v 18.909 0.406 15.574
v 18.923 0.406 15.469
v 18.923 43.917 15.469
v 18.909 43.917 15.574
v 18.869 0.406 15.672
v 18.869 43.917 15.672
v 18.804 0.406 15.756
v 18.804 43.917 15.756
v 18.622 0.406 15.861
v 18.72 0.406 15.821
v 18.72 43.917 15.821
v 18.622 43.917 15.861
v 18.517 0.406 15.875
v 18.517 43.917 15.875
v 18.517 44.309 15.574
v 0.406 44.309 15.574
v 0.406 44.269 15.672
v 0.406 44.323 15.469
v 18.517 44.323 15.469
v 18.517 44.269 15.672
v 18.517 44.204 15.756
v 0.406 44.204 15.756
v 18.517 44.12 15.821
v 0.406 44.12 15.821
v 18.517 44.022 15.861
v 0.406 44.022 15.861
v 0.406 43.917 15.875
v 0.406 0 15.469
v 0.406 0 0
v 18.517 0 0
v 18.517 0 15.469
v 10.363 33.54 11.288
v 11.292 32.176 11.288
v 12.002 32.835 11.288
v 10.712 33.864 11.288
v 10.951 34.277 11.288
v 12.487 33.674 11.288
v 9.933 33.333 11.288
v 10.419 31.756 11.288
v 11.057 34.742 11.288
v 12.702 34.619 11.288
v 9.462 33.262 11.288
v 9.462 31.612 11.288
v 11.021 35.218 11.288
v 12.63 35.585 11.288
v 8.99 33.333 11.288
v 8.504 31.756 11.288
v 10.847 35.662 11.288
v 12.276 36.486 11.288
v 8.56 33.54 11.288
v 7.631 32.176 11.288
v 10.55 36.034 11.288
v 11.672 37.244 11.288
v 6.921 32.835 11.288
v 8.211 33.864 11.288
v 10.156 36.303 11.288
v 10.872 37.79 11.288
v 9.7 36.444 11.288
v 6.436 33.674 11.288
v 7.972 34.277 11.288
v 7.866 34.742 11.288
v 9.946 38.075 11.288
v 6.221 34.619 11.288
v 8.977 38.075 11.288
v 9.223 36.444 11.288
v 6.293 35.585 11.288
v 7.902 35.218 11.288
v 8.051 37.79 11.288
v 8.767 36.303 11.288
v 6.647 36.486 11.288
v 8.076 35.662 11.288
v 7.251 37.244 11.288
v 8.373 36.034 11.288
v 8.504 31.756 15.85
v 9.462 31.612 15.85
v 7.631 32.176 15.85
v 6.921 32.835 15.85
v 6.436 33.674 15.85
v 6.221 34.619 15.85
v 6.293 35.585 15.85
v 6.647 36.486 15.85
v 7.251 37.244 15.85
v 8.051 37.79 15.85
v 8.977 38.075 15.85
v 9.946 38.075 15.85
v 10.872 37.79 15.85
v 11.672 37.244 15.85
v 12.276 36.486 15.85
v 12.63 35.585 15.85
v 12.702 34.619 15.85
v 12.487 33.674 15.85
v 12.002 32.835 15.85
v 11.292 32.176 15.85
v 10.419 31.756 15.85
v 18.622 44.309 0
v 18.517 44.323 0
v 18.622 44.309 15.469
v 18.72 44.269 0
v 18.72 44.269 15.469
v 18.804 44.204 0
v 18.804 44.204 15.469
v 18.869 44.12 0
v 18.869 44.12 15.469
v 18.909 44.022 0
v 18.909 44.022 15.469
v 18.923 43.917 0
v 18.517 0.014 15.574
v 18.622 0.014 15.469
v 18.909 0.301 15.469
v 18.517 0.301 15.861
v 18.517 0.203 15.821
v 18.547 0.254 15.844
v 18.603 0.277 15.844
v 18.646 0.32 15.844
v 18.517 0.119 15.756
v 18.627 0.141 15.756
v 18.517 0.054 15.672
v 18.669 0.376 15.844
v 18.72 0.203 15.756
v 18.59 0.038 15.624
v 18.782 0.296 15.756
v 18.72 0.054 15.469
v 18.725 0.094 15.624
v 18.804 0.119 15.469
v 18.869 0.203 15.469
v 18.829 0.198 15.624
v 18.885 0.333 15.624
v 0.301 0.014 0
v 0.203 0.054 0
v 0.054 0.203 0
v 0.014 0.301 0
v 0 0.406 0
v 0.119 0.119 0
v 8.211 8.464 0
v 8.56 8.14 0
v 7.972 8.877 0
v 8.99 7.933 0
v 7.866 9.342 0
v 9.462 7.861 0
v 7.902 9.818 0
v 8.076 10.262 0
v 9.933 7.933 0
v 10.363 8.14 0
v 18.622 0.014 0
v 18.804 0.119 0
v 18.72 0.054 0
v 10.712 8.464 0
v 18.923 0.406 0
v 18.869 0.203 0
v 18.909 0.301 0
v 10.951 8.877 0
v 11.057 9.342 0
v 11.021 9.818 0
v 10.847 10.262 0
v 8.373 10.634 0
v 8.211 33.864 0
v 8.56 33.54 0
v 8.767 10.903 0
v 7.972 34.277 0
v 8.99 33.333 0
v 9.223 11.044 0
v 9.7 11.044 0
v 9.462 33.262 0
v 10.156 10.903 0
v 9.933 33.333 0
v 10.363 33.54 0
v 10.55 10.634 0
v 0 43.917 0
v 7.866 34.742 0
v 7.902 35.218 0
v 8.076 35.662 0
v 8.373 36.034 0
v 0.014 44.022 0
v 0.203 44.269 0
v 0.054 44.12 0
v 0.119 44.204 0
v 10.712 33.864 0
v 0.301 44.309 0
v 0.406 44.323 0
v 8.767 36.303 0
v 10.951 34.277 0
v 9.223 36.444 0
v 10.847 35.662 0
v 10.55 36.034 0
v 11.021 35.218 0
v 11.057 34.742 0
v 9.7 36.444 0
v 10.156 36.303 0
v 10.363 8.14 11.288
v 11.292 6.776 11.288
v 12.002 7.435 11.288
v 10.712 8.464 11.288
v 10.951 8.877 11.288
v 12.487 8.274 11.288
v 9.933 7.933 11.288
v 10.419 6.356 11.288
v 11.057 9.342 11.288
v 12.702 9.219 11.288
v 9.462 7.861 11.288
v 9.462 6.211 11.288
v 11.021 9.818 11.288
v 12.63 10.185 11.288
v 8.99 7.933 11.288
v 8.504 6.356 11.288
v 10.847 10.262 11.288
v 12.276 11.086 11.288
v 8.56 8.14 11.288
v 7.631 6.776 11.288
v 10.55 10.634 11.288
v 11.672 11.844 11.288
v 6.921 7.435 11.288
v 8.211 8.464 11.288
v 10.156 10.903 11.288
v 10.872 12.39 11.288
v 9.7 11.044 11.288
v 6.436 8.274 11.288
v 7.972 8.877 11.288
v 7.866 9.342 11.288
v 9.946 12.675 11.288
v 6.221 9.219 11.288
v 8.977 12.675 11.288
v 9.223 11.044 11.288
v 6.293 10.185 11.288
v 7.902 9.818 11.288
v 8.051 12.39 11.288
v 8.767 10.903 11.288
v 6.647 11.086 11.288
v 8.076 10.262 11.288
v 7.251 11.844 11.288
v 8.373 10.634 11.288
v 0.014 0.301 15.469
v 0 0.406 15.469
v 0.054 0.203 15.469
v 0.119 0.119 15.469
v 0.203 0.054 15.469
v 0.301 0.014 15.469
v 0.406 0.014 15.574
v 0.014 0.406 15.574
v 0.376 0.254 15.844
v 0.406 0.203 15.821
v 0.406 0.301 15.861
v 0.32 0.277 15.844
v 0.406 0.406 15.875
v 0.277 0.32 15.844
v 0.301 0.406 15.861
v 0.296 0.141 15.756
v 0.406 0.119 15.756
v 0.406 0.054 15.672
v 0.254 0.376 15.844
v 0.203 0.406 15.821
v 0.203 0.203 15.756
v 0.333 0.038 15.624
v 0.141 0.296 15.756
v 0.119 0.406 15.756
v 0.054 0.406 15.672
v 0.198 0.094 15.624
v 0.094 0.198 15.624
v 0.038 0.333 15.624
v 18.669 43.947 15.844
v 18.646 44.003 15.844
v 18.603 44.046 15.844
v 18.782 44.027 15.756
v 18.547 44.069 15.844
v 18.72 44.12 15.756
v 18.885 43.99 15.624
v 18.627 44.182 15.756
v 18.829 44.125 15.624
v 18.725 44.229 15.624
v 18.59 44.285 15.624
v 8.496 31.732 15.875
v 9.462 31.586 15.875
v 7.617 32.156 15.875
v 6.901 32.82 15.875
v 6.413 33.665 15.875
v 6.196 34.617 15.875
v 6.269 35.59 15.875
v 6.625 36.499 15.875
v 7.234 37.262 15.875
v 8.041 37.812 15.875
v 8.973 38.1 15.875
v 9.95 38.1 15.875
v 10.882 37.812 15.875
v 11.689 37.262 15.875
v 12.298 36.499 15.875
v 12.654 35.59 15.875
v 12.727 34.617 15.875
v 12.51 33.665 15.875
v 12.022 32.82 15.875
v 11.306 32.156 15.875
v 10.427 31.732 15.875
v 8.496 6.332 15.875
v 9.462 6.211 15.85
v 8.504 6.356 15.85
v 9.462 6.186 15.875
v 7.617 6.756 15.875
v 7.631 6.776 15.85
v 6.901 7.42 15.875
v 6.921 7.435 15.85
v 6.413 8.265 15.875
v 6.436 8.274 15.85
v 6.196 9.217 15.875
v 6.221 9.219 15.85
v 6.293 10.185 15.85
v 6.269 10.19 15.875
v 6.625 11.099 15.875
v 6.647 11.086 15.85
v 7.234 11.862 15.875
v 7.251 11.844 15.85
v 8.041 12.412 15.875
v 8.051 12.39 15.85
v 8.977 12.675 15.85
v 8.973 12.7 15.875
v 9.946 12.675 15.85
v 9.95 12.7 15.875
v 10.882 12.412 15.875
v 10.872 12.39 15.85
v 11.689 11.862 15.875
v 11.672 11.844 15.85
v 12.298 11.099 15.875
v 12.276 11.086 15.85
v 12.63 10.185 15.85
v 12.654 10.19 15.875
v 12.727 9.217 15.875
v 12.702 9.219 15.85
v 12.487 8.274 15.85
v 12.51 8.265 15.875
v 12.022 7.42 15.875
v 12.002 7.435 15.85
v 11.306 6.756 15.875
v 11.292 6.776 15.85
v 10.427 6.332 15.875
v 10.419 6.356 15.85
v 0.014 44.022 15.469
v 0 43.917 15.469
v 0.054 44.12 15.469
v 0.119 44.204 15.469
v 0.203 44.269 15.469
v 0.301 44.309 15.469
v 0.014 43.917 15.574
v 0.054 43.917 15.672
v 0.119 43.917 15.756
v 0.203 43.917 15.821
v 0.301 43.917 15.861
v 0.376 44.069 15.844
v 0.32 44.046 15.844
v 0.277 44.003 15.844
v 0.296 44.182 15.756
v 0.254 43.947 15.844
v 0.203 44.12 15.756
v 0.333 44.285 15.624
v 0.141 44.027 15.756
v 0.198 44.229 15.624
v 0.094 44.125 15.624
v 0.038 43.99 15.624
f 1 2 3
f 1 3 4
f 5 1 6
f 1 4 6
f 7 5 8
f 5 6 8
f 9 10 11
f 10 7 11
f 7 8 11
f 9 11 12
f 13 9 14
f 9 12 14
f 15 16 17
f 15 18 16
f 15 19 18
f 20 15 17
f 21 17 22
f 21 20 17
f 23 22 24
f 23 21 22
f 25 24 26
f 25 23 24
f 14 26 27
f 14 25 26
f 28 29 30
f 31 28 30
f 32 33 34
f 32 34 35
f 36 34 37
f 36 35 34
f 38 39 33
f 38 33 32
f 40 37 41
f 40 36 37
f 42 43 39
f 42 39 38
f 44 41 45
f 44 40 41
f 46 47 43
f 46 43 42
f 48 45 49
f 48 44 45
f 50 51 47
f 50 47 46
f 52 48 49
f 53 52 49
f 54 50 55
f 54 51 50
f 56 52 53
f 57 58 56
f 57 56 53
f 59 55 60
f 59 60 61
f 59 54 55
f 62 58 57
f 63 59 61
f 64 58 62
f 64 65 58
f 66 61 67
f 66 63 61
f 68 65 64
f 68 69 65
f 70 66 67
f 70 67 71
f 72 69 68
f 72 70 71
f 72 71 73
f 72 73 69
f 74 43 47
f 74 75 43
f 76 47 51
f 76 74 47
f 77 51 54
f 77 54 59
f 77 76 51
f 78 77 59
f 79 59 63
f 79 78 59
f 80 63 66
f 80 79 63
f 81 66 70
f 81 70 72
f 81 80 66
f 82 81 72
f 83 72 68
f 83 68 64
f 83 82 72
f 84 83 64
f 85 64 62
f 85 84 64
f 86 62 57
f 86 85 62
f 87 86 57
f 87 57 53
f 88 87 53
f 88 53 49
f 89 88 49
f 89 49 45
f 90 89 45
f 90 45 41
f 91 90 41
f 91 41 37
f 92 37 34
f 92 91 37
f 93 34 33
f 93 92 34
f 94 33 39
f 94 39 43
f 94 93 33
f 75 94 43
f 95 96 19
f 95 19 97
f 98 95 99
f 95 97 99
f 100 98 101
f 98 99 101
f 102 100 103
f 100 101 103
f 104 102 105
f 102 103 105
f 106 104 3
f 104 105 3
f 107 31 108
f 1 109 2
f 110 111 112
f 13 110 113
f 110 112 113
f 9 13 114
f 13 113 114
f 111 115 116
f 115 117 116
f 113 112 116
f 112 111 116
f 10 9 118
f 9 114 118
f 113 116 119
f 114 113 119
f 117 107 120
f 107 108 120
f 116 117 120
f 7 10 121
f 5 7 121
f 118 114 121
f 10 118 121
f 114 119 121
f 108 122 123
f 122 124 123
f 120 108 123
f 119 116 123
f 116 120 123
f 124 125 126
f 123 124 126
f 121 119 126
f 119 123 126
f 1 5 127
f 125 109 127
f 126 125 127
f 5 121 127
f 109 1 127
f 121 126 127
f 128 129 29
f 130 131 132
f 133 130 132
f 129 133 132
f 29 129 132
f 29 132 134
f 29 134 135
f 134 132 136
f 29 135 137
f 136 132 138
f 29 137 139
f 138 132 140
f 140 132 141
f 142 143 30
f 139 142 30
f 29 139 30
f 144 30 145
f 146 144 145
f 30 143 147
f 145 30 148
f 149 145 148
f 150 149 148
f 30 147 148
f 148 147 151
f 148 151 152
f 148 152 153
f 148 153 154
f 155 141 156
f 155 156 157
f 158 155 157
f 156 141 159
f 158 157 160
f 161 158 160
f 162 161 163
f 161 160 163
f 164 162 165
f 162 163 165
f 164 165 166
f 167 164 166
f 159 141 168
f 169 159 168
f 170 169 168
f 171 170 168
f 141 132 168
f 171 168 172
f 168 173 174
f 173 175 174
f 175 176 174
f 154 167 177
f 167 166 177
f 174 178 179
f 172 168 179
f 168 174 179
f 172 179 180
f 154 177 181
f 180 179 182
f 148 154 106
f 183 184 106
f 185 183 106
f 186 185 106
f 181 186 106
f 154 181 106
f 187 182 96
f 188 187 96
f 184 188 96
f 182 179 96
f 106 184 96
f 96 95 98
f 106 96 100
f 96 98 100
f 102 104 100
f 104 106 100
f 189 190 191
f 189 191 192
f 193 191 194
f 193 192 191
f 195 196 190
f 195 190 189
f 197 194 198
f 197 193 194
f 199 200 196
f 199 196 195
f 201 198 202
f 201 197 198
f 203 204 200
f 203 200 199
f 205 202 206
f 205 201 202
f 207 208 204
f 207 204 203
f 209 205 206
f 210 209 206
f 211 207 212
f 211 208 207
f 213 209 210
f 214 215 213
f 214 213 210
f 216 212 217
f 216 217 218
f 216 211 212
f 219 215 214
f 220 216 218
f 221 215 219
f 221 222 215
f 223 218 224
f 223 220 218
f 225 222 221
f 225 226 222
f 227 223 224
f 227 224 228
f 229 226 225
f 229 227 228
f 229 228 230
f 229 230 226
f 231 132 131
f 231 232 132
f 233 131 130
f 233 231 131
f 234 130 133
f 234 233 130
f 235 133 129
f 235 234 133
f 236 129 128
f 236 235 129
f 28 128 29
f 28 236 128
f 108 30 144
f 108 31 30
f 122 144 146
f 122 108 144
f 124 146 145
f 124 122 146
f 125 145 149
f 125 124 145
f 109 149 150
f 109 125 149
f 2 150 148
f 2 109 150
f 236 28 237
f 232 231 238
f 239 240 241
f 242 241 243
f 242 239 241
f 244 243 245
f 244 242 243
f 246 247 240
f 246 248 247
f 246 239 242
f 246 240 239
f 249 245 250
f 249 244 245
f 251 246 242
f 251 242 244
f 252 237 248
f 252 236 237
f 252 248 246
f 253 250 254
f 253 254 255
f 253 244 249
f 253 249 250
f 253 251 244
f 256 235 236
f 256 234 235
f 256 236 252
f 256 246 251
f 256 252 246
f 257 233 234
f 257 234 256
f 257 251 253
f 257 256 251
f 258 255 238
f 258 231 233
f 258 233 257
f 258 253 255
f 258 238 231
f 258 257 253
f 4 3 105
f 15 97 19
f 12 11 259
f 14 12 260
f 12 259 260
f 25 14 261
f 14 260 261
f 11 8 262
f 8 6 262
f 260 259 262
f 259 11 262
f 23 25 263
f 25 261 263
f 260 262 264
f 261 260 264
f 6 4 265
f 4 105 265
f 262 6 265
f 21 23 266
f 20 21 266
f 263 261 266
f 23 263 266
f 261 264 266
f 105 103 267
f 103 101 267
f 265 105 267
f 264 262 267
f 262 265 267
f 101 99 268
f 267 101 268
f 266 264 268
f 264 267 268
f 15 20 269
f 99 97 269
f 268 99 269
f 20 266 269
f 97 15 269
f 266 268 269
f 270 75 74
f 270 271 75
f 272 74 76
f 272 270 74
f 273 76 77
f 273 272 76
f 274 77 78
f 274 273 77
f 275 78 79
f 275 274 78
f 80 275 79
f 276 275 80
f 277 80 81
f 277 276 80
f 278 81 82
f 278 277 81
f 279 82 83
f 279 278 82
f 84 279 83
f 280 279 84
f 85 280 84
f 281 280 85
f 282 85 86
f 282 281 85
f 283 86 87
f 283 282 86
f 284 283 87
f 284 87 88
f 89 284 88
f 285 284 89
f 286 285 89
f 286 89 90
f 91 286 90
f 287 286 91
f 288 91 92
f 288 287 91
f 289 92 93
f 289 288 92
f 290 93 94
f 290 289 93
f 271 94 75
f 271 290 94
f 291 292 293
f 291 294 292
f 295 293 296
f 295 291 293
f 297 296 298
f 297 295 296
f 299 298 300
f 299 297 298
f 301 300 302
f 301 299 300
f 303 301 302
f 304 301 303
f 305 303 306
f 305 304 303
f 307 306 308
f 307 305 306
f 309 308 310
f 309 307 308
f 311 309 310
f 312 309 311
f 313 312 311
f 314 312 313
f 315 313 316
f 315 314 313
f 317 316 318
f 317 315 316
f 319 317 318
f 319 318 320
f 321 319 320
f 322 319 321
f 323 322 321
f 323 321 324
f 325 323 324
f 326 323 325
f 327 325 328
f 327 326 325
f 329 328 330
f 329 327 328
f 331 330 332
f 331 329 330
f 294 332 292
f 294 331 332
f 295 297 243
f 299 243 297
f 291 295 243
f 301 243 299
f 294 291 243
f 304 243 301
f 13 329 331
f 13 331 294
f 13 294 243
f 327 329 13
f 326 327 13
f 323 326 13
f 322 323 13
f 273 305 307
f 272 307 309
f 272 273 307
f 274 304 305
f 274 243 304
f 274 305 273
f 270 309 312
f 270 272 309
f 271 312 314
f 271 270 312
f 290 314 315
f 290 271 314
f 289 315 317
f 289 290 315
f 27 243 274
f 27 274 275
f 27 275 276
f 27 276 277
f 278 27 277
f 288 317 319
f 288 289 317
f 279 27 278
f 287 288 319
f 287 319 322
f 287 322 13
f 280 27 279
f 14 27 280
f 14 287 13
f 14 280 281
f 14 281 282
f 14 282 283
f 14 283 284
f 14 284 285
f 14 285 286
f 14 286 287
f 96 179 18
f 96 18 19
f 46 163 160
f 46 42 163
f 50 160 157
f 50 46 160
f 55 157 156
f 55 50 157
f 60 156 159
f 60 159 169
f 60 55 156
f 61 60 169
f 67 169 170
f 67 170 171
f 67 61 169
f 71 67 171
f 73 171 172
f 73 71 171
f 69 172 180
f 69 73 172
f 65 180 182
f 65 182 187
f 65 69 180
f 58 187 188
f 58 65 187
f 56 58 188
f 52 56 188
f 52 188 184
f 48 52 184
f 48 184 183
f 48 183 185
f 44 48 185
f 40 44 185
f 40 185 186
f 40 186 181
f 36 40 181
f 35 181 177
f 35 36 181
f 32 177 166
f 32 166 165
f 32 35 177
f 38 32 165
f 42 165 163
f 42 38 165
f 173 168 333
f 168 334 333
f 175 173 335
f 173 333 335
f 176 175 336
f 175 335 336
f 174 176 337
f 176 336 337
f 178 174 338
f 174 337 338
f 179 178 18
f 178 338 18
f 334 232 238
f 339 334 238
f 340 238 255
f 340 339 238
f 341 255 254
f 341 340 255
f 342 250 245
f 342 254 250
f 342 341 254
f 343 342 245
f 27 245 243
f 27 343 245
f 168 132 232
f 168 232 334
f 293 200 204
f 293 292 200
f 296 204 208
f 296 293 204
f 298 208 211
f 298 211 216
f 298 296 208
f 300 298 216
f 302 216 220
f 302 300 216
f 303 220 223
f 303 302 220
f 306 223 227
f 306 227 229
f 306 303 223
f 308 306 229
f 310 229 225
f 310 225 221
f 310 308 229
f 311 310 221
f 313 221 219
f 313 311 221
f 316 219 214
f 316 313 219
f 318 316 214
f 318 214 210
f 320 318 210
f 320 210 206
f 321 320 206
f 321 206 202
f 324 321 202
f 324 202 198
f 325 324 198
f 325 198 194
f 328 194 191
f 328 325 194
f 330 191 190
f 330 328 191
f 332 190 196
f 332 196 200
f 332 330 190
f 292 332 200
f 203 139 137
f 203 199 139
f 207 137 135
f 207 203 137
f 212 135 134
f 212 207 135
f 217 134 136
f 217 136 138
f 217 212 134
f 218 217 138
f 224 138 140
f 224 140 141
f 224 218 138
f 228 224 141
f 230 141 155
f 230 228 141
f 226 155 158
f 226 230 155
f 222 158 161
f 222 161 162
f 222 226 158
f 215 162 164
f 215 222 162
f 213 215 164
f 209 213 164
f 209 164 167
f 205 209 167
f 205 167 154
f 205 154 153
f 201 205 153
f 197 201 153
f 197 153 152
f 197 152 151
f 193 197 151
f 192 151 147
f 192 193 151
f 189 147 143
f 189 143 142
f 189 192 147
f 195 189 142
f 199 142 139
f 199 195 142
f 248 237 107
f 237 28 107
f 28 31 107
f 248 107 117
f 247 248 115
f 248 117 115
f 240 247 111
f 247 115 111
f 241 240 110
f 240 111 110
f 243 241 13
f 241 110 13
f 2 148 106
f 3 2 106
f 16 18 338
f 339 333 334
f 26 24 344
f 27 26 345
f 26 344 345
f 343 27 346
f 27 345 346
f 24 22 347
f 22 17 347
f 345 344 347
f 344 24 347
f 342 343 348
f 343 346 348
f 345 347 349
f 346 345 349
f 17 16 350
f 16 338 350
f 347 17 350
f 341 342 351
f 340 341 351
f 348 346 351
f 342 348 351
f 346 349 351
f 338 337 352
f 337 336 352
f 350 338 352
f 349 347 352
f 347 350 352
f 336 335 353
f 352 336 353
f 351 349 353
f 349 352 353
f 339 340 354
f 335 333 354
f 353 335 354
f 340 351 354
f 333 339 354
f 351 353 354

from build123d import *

# Parameters (mm, degrees)
SKETCH1_W                     = 18.923
SKETCH1_H                     = 44.323
SKETCH1_R                     = 1.5875
BOSS_EXTRUDE1_DEPTH           = 15.875
FILLET1_R                     = 0.4064
CBORE_FOR_M3_SHCS1_AT_2_COUNT = 2
CBORE_FOR_M3_SHCS1_AT_2_PITCH = 25.4


with BuildPart() as part:
    # Sketch1 → Boss-Extrude1 (new body)
    with BuildSketch(Plane.XY):
        with Locations((9.4615, 22.1615)):
            Rectangle(SKETCH1_W, SKETCH1_H)
        with Locations((9.4615, 9.4615)):
            Circle(SKETCH1_R, mode=Mode.SUBTRACT)
        with Locations((9.4615, 34.8615)):
            Circle(SKETCH1_R, mode=Mode.SUBTRACT)
    extrude(amount=BOSS_EXTRUDE1_DEPTH)

    # Fillet1
    fillet1_edges = [part.edges().sort_by_distance(p)[0] for p in [
        (0, 0, 7.9375),
        (0, 44.323, 7.9375),
        (18.923, 44.323, 7.9375),
        (18.923, 0, 7.9375),
        (7.874, 34.8615, 15.875),
        (9.4615, 0, 15.875),
        (18.923, 22.1615, 15.875),
        (9.4615, 44.323, 15.875),
        (0, 22.1615, 15.875),
        (7.874, 9.4615, 15.875),
    ]]
    fillet(fillet1_edges, radius=FILLET1_R)

    # Sketch2 → CBORE for M3 SHCS1 (revolve, cut)
    with BuildSketch(Plane(origin=(9.4615, 9.4615, 15.875), x_dir=(0, -1, 0), z_dir=(1, 0, 0))):
        Polygon((0, 0), (0, 15.875), (1.6, 15.875), (1.6, 4.5875), (3.25, 4.5875), (3.25, 0.025), (3.275, 0), align=None)
    cbore_for_m3_shcs1 = revolve(axis=Axis((9.4615, 9.4615, 22.225), (0, 0, -1)), mode=Mode.SUBTRACT)

    # CBORE for M3 SHCS1 at 2: CBORE for M3 SHCS1 ×2
    with Locations(*[(0, i * CBORE_FOR_M3_SHCS1_AT_2_PITCH, 0) for i in range(1, CBORE_FOR_M3_SHCS1_AT_2_COUNT)]):
        add(cbore_for_m3_shcs1, mode=Mode.SUBTRACT)


solid = part.part
